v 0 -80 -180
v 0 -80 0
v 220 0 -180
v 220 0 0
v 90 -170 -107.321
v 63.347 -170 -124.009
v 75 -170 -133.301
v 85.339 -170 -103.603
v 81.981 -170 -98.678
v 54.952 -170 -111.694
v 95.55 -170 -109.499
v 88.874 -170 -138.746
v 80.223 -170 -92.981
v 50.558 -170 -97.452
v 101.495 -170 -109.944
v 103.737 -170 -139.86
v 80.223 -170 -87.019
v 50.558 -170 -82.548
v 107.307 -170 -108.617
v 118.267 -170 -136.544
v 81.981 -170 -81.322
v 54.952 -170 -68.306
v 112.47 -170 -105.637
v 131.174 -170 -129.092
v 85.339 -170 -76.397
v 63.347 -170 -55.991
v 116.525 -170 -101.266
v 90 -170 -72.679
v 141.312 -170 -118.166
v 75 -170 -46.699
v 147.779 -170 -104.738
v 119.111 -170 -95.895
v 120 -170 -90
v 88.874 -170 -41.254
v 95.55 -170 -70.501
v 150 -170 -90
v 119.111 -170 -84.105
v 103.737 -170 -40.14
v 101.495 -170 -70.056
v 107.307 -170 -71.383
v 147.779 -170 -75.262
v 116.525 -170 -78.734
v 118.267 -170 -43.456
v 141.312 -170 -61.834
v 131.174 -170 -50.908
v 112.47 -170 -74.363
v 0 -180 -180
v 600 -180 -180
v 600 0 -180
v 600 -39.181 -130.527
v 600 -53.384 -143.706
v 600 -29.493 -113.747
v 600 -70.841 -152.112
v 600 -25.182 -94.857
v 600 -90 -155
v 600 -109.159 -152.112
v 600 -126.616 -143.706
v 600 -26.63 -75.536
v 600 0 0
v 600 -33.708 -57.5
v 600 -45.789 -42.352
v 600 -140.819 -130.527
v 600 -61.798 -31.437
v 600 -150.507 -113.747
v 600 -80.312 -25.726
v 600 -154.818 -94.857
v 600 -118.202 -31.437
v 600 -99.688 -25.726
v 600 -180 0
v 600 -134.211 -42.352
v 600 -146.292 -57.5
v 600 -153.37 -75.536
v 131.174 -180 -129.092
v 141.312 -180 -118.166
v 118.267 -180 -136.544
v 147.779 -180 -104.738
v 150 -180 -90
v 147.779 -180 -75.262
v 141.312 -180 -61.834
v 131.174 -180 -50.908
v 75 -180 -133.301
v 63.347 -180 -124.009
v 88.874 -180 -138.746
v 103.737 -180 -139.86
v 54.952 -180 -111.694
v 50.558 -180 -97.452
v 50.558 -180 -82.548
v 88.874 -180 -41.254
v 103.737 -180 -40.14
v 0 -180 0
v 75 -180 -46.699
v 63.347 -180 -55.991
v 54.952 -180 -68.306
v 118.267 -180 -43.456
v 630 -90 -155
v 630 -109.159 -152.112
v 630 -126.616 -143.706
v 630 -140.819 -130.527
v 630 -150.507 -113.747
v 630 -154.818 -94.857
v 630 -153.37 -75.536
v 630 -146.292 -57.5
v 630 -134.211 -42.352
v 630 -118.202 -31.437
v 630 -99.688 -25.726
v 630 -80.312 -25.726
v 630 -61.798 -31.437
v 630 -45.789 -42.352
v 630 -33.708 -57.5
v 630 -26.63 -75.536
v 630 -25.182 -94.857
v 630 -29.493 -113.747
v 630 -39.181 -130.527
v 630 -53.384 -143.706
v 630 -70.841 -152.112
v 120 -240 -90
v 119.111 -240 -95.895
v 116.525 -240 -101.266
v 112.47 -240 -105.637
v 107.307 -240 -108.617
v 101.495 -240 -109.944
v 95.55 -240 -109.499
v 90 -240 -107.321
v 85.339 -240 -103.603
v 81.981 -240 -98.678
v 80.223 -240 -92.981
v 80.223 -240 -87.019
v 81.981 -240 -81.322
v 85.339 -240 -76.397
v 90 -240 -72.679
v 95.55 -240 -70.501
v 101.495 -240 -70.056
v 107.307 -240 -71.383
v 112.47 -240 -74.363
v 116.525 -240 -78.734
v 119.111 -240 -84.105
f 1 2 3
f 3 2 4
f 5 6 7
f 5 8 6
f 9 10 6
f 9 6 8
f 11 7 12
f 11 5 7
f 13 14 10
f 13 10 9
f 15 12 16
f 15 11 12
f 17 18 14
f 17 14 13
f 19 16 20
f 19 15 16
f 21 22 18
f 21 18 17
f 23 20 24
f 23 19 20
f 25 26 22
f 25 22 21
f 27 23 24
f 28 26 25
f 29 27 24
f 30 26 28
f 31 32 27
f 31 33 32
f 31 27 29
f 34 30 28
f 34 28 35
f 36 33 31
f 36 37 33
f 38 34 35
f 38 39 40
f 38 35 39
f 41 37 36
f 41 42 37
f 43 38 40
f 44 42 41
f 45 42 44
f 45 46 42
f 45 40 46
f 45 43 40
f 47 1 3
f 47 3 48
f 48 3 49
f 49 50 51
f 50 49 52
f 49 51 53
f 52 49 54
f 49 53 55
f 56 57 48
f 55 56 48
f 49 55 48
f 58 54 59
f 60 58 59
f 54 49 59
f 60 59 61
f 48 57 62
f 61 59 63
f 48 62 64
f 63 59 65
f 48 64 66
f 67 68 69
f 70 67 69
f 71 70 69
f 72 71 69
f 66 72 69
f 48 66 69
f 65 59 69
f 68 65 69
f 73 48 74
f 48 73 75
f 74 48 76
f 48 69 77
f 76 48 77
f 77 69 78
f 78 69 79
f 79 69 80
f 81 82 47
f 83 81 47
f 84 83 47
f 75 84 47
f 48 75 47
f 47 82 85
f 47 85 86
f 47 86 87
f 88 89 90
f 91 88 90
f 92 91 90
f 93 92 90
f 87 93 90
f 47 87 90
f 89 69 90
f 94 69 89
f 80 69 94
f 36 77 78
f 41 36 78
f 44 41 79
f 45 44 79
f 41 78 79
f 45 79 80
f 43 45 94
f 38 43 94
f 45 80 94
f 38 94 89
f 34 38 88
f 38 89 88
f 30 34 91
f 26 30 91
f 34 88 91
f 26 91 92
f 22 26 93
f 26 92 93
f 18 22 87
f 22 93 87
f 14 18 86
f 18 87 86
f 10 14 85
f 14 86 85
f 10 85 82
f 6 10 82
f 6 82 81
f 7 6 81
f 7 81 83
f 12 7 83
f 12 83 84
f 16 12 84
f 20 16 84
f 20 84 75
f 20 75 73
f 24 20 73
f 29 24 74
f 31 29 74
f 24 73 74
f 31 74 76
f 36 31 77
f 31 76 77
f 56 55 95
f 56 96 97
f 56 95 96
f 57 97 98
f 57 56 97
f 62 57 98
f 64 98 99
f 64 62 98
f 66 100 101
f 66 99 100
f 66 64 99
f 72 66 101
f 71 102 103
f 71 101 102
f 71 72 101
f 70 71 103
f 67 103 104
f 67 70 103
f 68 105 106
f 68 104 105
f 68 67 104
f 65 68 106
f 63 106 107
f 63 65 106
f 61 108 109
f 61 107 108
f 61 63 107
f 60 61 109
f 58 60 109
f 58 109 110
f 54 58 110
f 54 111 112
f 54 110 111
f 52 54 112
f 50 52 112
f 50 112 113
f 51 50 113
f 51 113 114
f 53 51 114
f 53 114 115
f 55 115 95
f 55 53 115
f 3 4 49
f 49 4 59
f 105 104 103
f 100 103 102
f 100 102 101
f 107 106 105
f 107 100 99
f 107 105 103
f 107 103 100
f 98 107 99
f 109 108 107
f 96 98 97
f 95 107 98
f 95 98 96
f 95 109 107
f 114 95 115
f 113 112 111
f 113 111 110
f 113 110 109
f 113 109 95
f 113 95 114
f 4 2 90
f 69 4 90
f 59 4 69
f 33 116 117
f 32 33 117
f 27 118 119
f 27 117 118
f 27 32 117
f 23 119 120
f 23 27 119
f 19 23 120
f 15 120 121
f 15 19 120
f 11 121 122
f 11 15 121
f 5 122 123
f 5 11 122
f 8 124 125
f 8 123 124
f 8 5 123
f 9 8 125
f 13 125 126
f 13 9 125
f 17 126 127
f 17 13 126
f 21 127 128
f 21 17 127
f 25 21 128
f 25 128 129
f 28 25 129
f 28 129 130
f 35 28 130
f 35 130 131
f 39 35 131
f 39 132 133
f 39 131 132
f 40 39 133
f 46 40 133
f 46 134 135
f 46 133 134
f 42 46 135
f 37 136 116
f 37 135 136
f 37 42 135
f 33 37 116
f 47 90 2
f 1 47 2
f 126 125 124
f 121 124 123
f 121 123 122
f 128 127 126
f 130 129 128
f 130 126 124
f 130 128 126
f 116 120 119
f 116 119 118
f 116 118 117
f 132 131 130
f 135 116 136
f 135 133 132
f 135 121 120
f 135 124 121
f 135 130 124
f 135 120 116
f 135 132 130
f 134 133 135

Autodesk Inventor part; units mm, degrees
ref_plane "YZ Plane" through (0, 0, 0) normal (1, 0, 0) x (0, 1, 0)
ref_plane "XZ Plane" through (0, 0, 0) normal (0, 1, 0) x (-1, 0, 0)
ref_plane "XY Plane" through (0, 0, 0) normal (0, 0, 1) x (1, 0, 0)
sketch "Náčrt1" plane through (0, 0, 0) normal (0, 0, 1) x (1, 0, 0)
  line L0 (0, 0) -> (600, 0)
  line L1 (600, 0) -> (600, -180)
  line L2 (600, -180) -> (0, -180)
  line L3 (0, -180) -> (0, 0)
  line L4 (0, -80) -> (220, 0)
  dimension "d43" = 600
  dimension "d44" = 180
  dimension "d45" = 100
  dimension "d46" = 220
extrude "Vysunutí1" add sketch "Náčrt1" against normal blind 180 contours L0 L1 L2 L3 L4
sketch "Náčrt6" plane through (600, -180, 0) normal (1, 0, 0) x (0, 0, -1)
  line L0 (180, 180) -> (180, 0) projected
  line L1 (0, 0) -> (0, 180) projected
  line L2 (180, 180) -> (0, 0) construction
  circle A0 centre (90, 90) radius 65
  dimension "d47" = 130
extrude "Vysunutí6" add sketch "Náčrt6" along normal blind 30
sketch "Náčrt7" plane through (0, -180, 0) normal (0, -1, 0) x (1, 0, 0)
  circle A0 centre (100, -90) radius 50
  line L0 (0, 0) -> (0, -180) projected
  line L1 (0, -90) -> (285.9708, -90) construction
  dimension "d50" = 100
  dimension "d51" = 100
extrude "Vysunutí7" cut sketch "Náčrt7" against normal blind 10
sketch "Náčrt8" plane through (100, -170, -90) normal (0, -1, 0) x (1, 0, 0)
  circle A0 centre (0, 0) radius 20
  point P0 (-100, 90)
  dimension "d54" = 40
extrude "Vysunutí8" add sketch "Náčrt8" along normal blind 70
sketch "Náčrt5" plane through (0, 0, 0) normal (0, 0, 1) x (-1, 0, 0)
  circle A0 centre (0, 0) radius 65
  dimension "d40" = 130
properties part number "B7-A3"
